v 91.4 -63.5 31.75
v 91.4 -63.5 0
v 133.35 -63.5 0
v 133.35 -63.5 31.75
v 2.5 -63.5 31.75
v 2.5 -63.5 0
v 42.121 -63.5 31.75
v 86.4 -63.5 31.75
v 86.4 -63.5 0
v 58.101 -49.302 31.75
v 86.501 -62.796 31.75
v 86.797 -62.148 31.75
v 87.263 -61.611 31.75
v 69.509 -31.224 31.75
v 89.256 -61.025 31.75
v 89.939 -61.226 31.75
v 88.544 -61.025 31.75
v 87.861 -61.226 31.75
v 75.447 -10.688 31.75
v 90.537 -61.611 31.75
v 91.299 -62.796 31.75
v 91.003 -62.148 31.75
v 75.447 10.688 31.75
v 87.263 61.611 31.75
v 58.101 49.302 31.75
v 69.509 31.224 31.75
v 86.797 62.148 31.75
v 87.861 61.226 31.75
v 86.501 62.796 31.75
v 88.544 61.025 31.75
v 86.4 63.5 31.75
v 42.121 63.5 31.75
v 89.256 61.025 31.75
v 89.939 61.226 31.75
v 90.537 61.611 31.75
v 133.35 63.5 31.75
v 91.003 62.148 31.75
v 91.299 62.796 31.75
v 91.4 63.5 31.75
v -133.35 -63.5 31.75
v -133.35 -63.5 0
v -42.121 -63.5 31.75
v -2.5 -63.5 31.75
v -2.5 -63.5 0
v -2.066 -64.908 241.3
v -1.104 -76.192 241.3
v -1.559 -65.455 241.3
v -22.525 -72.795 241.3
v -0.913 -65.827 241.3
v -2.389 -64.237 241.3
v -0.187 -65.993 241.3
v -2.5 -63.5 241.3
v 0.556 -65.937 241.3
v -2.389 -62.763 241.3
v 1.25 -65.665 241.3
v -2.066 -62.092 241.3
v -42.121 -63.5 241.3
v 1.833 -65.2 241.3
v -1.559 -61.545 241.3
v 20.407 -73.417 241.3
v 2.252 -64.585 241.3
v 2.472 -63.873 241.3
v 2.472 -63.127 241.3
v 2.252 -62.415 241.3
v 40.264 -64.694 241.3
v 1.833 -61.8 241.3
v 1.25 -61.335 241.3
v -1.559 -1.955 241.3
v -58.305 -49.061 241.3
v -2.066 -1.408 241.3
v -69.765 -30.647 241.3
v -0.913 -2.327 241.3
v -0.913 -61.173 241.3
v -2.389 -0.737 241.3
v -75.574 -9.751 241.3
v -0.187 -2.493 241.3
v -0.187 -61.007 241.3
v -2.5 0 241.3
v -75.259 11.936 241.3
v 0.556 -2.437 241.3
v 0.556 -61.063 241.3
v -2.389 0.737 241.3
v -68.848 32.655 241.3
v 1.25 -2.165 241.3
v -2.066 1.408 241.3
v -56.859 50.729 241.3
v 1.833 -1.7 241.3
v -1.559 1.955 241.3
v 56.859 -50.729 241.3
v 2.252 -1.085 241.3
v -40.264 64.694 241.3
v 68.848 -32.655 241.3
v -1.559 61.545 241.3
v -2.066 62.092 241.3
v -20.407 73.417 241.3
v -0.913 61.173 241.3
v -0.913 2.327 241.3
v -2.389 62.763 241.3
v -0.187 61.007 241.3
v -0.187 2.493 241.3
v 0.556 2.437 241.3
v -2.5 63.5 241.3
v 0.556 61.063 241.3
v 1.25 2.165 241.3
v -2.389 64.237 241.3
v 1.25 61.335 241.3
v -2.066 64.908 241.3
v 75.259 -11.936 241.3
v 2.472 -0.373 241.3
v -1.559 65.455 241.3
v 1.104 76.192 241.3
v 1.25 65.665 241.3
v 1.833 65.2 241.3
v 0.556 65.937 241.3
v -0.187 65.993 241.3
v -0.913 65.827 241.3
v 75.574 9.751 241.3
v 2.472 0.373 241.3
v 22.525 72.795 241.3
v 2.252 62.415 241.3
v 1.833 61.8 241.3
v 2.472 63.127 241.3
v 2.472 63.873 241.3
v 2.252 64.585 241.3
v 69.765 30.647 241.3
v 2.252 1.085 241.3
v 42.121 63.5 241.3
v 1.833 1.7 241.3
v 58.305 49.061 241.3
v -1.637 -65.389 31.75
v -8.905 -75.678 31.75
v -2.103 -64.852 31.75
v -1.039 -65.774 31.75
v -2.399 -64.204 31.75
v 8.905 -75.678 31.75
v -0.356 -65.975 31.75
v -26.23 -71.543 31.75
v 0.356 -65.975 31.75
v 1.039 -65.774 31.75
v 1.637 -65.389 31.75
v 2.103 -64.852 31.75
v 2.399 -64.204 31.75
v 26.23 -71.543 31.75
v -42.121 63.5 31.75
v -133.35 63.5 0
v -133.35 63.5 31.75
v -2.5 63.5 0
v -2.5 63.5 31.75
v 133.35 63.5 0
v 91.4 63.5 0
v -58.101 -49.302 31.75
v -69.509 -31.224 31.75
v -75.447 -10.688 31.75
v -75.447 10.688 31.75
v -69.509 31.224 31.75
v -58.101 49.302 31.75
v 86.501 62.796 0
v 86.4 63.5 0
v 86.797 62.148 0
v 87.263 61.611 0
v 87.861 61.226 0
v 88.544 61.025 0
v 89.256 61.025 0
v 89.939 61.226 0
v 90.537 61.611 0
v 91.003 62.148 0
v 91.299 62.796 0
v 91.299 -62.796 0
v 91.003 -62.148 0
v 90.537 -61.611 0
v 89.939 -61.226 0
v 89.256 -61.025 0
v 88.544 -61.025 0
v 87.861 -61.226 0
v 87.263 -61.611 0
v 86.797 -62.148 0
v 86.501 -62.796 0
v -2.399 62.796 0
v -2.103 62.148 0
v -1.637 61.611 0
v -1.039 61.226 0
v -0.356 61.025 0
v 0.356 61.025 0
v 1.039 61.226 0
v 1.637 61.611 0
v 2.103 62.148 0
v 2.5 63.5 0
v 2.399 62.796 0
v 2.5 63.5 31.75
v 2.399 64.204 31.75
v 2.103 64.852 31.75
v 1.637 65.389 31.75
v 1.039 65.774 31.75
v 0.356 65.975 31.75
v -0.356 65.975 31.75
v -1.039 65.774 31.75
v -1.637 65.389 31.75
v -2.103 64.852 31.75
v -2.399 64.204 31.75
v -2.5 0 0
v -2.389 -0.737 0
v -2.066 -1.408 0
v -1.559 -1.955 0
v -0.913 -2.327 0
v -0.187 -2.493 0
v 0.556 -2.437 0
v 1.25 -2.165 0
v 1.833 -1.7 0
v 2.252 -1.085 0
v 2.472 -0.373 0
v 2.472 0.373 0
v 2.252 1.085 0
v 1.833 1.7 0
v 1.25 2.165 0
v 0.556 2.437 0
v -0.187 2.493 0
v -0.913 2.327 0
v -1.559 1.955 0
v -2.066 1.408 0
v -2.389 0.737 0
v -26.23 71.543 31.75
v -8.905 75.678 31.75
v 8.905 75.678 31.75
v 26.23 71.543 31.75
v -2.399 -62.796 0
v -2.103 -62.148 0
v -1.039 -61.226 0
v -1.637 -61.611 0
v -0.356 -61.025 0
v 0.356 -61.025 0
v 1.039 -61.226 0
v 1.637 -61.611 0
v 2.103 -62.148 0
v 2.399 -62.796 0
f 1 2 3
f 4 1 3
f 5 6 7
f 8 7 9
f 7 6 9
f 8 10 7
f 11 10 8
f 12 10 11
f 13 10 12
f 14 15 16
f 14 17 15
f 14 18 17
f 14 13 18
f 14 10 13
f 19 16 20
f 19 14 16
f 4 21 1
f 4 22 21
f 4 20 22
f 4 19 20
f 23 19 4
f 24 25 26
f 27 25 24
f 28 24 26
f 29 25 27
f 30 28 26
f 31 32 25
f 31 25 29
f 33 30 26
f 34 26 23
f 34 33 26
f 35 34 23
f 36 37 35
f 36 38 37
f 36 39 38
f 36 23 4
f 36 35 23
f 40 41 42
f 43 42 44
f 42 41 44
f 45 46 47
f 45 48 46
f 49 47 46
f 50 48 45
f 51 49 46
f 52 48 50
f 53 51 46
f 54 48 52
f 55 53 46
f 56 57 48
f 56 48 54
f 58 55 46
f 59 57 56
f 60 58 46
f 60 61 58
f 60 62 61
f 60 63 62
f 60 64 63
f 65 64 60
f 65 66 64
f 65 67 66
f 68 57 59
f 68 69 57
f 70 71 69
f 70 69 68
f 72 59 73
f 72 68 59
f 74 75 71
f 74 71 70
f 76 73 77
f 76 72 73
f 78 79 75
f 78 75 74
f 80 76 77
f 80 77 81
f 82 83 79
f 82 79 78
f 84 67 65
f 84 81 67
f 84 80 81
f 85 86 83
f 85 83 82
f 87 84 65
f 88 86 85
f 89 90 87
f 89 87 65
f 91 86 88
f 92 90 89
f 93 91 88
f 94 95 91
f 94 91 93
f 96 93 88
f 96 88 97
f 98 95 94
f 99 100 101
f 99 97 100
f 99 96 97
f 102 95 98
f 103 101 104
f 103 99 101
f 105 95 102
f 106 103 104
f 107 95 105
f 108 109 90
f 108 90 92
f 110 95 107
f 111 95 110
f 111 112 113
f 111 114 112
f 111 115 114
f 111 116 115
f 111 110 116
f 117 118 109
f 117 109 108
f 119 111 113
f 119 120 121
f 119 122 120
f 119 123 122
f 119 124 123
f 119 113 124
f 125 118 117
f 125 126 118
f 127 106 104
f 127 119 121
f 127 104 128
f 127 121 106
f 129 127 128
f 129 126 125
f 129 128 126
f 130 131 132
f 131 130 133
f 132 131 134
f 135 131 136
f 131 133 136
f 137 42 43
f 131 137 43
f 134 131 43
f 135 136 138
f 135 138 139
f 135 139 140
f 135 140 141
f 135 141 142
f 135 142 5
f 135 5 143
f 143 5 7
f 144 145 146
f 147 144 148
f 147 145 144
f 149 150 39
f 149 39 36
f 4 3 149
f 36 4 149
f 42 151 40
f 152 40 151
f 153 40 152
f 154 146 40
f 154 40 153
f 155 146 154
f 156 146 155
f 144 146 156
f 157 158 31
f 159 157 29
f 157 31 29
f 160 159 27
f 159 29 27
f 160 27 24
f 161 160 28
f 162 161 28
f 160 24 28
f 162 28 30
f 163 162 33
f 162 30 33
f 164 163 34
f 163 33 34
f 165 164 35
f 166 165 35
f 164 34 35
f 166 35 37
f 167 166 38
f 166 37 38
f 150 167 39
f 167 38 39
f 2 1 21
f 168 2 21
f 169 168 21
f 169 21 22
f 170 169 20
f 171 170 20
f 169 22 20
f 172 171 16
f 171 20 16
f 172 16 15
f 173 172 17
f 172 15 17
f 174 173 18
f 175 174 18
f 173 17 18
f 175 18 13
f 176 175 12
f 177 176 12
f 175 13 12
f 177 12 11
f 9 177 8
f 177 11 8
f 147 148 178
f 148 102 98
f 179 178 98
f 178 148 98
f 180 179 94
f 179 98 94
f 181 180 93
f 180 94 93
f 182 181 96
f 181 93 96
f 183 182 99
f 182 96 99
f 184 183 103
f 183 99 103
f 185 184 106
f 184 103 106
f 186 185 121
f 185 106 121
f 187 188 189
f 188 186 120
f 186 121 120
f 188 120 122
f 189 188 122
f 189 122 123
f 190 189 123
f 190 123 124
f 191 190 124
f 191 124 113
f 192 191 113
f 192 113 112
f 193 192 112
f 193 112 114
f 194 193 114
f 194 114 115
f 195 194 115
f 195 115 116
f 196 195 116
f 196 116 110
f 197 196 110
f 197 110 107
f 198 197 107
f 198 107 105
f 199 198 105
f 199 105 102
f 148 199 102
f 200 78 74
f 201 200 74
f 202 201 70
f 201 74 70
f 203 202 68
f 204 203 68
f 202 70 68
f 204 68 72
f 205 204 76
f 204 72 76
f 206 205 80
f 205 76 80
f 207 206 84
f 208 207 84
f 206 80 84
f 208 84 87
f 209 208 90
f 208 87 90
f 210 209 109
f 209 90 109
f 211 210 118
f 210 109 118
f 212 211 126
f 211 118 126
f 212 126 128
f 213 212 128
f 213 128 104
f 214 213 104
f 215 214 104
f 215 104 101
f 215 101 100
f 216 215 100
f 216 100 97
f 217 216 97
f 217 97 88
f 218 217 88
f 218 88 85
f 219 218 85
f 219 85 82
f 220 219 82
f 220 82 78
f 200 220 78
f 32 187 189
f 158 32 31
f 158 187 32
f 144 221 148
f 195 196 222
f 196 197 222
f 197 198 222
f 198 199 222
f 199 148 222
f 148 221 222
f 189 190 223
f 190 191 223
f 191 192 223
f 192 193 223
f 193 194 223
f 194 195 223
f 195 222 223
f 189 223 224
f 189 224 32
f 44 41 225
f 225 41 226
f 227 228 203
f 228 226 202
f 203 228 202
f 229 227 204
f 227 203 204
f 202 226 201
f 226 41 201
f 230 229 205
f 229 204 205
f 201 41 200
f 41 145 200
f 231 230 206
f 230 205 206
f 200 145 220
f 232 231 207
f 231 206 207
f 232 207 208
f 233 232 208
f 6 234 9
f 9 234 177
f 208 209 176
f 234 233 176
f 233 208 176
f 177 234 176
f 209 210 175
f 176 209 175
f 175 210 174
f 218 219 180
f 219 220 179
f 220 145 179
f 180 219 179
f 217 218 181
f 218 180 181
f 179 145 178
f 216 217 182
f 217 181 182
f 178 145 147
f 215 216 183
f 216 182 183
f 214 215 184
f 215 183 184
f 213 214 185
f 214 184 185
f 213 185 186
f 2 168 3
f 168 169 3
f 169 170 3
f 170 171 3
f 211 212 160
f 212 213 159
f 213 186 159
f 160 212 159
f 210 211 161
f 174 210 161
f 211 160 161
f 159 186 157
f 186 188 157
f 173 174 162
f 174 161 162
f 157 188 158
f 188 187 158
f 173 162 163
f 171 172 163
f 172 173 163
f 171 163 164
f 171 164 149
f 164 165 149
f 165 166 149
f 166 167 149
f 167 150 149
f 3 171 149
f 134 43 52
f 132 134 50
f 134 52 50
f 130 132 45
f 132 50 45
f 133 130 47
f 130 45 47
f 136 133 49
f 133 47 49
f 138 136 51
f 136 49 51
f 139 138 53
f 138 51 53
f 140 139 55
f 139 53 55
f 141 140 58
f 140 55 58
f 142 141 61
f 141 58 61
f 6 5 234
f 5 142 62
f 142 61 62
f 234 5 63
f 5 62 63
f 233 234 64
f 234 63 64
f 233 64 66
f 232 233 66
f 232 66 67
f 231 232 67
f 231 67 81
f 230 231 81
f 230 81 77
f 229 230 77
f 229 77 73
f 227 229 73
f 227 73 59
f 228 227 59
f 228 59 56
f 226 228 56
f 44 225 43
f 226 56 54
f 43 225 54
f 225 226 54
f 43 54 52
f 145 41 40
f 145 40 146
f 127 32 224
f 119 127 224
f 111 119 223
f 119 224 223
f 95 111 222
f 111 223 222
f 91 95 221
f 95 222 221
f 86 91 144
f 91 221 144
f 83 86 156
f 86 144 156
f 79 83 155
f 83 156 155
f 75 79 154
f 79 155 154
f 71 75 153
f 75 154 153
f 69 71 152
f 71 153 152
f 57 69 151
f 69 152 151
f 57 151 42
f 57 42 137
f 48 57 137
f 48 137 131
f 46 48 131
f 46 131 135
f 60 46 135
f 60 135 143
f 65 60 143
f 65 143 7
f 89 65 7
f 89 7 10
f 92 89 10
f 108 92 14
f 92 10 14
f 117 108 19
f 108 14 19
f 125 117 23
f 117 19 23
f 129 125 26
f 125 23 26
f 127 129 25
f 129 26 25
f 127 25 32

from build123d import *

# Parameters (mm, degrees)
F0_W     = 266.7
F0_H     = 127
F1_DEPTH = 31.75
F3_DEPTH = 209.55
F4_D     = 5


with BuildPart() as f1:
    # F0 (on Top) → F1 (new body)
    with BuildSketch(Plane.XY):
        Rectangle(F0_W, F0_H)
    extrude(amount=F1_DEPTH)

    # F2 (on face) → F3 (join)
    with BuildSketch(Plane.XY.offset(31.75)):
        with BuildLine():
            Line((-42.1211348375, 63.5), (42.1211348375, 63.5))
            ThreePointArc((42.1211348375, 63.5), (0, 76.2), (-42.1211348375, 63.5))
        make_face()
        with BuildLine():
            ThreePointArc((42.1211348375, -63.5), (67.1419037361, -36.0333840028), (76.2, 0))
            ThreePointArc((76.2, 0), (67.1419037361, 36.0333840028), (42.1211348375, 63.5))
            Line((42.1211348375, 63.5), (-42.1211348375, 63.5))
            ThreePointArc((-42.1211348375, 63.5), (-76.2, 0), (-42.1211348375, -63.5))
            Line((-42.1211348375, -63.5), (42.1211348375, -63.5))
        make_face()
        with BuildLine():
            ThreePointArc((-42.1211348375, -63.5), (0, -76.2), (42.1211348375, -63.5))
            Line((42.1211348375, -63.5), (-42.1211348375, -63.5))
        make_face()
    extrude(amount=F3_DEPTH)

    # F4 (through all)
    with Locations(Plane(origin=(0, 0, 0), x_dir=(1, 0, 0), z_dir=(0, 0, -1))):
        with Locations((88.9, -63.5), (88.9, 63.5), (0, 63.5), (0, -63.5), (0, 0)):
            Hole(F4_D / 2)


solid = f1.part
